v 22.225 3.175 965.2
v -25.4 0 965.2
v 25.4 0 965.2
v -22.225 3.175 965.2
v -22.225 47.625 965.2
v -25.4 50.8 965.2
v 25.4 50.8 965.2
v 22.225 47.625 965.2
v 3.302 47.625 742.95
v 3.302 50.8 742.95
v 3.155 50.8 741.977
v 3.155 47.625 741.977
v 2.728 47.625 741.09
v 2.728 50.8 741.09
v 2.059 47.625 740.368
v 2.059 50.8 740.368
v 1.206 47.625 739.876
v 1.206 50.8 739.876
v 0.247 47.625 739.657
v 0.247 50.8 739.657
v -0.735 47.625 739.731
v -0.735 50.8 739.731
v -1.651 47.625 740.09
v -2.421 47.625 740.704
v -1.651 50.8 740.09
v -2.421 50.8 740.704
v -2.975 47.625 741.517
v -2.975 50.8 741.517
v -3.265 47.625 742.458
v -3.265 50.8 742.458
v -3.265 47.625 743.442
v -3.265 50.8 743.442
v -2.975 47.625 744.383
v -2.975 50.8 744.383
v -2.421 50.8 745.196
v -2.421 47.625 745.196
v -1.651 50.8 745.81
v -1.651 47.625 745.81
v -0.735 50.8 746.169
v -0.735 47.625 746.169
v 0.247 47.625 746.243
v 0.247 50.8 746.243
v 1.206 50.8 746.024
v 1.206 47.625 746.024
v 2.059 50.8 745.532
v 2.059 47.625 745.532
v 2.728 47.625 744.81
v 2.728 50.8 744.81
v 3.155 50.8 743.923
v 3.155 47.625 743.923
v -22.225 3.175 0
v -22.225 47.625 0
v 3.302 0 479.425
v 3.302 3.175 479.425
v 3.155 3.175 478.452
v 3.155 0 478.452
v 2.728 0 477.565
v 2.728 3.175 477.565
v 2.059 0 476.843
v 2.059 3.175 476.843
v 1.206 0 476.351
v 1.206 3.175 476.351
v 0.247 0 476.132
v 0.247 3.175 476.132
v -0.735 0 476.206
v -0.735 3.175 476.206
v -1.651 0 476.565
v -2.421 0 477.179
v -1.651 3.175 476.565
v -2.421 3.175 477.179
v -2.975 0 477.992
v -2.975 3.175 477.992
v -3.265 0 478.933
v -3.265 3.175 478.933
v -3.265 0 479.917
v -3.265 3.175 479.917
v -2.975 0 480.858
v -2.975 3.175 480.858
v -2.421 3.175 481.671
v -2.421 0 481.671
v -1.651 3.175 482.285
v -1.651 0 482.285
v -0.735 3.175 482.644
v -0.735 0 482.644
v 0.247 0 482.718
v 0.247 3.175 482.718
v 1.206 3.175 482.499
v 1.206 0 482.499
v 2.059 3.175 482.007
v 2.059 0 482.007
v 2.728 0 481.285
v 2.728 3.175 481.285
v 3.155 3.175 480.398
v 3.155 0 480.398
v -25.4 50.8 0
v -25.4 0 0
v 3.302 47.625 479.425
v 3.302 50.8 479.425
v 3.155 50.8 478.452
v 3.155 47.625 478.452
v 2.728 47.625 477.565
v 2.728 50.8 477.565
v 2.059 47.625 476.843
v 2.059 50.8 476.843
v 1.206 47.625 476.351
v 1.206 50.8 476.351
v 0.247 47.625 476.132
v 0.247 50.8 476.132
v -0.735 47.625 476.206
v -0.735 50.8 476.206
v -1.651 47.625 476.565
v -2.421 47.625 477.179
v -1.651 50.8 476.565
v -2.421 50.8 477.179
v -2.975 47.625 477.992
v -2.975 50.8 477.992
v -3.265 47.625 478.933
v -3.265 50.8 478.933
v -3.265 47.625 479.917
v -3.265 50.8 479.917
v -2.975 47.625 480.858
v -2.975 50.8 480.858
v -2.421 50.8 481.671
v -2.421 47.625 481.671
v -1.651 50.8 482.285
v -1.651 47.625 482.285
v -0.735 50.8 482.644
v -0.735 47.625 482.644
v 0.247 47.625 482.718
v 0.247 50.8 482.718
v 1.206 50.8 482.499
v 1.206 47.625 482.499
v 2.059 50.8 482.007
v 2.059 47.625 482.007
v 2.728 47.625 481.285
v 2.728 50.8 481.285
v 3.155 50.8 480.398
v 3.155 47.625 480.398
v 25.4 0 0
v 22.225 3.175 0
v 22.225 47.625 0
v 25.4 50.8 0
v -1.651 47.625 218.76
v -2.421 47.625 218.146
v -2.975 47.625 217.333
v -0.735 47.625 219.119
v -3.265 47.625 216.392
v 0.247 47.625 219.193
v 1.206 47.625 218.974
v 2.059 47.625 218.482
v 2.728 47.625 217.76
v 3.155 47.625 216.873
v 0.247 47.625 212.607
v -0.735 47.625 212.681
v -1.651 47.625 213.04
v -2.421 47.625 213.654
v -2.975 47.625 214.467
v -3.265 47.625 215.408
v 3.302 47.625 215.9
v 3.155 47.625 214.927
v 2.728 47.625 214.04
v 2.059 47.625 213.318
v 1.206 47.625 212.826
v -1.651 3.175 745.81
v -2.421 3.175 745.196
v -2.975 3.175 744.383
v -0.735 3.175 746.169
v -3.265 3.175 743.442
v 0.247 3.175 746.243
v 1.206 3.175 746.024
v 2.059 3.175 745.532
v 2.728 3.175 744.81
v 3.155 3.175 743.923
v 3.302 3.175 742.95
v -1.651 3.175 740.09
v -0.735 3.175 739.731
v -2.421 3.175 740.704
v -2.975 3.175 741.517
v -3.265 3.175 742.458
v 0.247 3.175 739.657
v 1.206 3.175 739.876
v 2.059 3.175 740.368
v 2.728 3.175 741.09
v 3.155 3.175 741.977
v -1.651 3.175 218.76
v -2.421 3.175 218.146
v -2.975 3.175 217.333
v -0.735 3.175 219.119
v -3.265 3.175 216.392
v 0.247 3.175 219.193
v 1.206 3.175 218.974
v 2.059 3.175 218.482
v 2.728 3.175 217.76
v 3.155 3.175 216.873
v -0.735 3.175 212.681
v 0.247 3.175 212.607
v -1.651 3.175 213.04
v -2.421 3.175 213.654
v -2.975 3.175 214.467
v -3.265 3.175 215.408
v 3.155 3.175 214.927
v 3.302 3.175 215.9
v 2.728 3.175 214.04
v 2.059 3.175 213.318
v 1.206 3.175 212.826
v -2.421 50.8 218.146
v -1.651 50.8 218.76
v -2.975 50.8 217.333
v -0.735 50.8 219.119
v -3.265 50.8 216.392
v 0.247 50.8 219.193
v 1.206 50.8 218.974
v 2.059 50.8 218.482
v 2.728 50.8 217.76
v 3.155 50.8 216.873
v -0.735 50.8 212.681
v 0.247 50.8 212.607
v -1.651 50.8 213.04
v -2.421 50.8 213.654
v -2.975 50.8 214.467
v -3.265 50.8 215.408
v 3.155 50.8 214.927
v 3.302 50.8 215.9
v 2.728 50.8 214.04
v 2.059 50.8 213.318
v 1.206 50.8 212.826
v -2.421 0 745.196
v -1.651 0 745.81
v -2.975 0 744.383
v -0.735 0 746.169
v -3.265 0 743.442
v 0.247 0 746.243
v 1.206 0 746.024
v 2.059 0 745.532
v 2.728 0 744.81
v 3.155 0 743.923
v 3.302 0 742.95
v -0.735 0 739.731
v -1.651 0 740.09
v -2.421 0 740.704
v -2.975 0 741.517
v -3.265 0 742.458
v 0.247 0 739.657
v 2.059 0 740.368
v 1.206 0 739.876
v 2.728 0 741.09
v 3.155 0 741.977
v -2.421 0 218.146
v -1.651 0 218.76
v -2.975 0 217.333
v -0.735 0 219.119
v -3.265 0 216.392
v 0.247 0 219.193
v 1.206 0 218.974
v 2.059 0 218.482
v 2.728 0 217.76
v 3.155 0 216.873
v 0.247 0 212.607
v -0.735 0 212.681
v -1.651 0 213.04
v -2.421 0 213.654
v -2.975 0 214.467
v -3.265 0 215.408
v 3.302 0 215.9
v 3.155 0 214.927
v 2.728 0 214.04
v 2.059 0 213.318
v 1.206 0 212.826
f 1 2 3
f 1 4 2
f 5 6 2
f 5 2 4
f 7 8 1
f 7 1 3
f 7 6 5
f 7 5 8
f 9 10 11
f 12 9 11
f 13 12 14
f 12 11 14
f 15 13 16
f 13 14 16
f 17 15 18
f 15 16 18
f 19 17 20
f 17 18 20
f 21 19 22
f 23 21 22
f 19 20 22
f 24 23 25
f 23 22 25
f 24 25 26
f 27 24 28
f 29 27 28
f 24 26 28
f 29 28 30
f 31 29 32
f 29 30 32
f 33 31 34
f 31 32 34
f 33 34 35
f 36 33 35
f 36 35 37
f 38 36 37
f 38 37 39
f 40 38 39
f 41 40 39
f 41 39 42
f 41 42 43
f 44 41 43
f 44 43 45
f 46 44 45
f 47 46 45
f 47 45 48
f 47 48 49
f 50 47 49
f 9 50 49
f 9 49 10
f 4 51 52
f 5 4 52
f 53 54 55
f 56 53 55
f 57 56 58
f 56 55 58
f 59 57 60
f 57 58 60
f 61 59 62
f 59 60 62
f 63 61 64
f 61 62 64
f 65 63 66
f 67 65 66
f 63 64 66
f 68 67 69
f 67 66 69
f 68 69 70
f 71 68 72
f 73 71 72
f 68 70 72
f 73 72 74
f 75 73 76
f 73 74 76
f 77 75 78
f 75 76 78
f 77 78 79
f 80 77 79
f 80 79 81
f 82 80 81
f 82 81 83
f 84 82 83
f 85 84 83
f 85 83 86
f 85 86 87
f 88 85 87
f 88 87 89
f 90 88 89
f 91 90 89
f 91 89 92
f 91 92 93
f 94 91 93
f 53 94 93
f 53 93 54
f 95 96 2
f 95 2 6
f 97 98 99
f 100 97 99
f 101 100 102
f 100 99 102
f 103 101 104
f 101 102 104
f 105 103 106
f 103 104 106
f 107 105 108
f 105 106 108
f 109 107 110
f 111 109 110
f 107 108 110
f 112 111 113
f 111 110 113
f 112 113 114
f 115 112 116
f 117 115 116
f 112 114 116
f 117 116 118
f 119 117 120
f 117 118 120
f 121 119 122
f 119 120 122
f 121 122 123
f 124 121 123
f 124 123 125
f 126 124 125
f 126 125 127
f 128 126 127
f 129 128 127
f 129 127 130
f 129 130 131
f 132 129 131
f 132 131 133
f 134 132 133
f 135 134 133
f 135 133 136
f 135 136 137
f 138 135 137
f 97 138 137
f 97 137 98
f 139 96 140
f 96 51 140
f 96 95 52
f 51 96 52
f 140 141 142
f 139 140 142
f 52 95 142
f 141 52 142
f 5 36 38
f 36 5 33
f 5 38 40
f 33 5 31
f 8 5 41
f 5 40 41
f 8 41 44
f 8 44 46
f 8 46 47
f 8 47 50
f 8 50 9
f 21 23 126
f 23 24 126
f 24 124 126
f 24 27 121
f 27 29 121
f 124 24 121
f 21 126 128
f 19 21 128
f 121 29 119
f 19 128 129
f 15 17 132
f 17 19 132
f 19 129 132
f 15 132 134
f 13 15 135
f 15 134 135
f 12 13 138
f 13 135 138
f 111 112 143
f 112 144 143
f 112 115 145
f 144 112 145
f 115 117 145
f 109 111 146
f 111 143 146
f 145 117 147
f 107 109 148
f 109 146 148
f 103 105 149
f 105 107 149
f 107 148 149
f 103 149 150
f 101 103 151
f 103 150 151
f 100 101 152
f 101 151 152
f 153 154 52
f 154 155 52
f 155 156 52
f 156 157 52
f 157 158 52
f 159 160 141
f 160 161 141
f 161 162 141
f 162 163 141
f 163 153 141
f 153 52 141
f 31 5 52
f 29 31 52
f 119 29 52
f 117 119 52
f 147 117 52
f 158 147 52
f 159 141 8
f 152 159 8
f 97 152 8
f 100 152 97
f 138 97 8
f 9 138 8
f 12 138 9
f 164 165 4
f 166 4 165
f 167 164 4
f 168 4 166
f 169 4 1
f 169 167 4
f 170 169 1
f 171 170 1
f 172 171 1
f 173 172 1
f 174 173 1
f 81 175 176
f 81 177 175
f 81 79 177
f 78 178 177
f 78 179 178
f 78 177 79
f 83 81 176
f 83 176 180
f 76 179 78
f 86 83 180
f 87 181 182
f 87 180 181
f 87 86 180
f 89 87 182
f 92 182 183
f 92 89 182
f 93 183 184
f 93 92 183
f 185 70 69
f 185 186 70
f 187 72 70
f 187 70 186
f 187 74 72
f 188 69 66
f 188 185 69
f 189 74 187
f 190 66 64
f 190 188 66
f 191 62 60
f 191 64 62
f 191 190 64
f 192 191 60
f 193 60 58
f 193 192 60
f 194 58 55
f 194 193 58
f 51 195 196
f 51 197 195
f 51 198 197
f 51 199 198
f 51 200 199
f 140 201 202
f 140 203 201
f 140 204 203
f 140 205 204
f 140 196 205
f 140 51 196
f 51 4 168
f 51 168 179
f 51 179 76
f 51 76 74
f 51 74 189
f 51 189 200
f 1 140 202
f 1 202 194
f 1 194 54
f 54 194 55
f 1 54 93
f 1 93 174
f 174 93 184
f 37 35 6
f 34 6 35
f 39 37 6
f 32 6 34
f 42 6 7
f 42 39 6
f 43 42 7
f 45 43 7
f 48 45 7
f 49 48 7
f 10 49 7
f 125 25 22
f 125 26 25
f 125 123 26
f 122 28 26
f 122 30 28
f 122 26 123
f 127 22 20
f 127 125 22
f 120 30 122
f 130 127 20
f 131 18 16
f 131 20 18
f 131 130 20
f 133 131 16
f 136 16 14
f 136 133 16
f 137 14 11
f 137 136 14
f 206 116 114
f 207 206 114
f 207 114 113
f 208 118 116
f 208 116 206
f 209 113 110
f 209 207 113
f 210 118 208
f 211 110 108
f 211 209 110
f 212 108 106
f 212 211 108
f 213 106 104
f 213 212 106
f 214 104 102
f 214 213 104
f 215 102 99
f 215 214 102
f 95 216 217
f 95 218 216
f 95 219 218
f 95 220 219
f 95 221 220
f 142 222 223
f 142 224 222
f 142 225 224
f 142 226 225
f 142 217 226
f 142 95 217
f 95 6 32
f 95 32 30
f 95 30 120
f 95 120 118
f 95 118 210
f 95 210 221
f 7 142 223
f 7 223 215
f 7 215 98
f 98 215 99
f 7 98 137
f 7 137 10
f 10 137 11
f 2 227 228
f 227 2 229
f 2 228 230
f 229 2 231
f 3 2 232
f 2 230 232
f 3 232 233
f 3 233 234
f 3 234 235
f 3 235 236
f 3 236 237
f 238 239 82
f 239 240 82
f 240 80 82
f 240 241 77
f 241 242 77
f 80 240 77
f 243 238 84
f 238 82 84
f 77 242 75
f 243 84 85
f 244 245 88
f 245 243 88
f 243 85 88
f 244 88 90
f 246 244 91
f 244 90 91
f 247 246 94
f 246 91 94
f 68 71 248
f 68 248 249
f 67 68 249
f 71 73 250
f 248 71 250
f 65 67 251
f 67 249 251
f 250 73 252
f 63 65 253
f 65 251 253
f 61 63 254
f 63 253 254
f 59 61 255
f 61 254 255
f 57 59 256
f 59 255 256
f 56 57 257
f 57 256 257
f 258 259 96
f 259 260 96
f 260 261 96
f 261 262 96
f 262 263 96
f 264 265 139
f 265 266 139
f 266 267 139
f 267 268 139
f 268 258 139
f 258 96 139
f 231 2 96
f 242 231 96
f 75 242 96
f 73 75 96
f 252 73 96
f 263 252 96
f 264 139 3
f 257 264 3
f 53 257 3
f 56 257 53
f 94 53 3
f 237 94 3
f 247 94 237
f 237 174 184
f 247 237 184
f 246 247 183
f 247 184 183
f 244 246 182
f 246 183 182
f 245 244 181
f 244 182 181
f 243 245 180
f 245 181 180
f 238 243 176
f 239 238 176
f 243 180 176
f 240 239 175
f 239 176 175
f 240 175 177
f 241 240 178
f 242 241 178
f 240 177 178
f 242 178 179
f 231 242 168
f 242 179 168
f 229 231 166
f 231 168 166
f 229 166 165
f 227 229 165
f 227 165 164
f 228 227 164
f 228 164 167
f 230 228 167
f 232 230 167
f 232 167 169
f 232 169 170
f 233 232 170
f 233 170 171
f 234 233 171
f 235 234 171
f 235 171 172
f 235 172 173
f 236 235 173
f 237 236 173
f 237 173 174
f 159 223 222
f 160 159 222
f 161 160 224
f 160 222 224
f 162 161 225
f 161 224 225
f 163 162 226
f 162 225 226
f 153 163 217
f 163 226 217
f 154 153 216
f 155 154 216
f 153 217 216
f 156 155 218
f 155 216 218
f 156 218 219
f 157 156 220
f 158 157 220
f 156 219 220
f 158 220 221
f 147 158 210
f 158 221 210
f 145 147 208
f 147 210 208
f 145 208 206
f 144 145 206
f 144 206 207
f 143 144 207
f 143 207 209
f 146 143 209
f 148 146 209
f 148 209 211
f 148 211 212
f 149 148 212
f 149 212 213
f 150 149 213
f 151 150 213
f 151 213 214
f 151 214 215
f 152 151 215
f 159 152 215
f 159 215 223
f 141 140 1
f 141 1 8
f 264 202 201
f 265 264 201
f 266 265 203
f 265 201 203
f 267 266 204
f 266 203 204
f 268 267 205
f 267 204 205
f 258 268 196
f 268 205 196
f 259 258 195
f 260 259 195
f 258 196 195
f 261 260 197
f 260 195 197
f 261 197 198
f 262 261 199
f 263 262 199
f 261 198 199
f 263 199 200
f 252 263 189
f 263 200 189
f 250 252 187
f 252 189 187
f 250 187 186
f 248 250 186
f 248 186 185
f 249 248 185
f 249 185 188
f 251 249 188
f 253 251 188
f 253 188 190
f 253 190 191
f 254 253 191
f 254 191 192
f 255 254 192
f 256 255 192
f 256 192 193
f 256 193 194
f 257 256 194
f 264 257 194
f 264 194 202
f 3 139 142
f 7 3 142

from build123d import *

# Parameters (mm, degrees)
SKETCH1_W           = 50.8
SKETCH1_H           = 50.8
SKETCH1_W_2         = 44.45
SKETCH1_H_2         = 44.45
BOSS_EXTRUDE1_DEPTH = 965.2
SKETCH2_R           = 3.302
CUT_EXTRUDE1_DEPTH  = 51.8


with BuildPart() as part:
    # Sketch1 → Boss-Extrude1 (new body)
    with BuildSketch(Plane.XY):
        with Locations((0, 25.4)):
            Rectangle(SKETCH1_W, SKETCH1_H)
        with Locations((0, 25.4)):
            Rectangle(SKETCH1_W_2, SKETCH1_H_2, mode=Mode.SUBTRACT)
    extrude(amount=BOSS_EXTRUDE1_DEPTH)

    # Sketch2 → Cut-Extrude1 (cut, through all)
    with BuildSketch(Plane(origin=(0, 50.8, 0), x_dir=(1, 0, 0), z_dir=(0, 1, 0))):
        with Locations((0, -215.9)):
            Circle(SKETCH2_R)
        with Locations((0, -479.425)):
            Circle(SKETCH2_R)
        with Locations((0, -742.95)):
            Circle(SKETCH2_R)
    extrude(amount=-CUT_EXTRUDE1_DEPTH, mode=Mode.SUBTRACT)


solid = part.part
